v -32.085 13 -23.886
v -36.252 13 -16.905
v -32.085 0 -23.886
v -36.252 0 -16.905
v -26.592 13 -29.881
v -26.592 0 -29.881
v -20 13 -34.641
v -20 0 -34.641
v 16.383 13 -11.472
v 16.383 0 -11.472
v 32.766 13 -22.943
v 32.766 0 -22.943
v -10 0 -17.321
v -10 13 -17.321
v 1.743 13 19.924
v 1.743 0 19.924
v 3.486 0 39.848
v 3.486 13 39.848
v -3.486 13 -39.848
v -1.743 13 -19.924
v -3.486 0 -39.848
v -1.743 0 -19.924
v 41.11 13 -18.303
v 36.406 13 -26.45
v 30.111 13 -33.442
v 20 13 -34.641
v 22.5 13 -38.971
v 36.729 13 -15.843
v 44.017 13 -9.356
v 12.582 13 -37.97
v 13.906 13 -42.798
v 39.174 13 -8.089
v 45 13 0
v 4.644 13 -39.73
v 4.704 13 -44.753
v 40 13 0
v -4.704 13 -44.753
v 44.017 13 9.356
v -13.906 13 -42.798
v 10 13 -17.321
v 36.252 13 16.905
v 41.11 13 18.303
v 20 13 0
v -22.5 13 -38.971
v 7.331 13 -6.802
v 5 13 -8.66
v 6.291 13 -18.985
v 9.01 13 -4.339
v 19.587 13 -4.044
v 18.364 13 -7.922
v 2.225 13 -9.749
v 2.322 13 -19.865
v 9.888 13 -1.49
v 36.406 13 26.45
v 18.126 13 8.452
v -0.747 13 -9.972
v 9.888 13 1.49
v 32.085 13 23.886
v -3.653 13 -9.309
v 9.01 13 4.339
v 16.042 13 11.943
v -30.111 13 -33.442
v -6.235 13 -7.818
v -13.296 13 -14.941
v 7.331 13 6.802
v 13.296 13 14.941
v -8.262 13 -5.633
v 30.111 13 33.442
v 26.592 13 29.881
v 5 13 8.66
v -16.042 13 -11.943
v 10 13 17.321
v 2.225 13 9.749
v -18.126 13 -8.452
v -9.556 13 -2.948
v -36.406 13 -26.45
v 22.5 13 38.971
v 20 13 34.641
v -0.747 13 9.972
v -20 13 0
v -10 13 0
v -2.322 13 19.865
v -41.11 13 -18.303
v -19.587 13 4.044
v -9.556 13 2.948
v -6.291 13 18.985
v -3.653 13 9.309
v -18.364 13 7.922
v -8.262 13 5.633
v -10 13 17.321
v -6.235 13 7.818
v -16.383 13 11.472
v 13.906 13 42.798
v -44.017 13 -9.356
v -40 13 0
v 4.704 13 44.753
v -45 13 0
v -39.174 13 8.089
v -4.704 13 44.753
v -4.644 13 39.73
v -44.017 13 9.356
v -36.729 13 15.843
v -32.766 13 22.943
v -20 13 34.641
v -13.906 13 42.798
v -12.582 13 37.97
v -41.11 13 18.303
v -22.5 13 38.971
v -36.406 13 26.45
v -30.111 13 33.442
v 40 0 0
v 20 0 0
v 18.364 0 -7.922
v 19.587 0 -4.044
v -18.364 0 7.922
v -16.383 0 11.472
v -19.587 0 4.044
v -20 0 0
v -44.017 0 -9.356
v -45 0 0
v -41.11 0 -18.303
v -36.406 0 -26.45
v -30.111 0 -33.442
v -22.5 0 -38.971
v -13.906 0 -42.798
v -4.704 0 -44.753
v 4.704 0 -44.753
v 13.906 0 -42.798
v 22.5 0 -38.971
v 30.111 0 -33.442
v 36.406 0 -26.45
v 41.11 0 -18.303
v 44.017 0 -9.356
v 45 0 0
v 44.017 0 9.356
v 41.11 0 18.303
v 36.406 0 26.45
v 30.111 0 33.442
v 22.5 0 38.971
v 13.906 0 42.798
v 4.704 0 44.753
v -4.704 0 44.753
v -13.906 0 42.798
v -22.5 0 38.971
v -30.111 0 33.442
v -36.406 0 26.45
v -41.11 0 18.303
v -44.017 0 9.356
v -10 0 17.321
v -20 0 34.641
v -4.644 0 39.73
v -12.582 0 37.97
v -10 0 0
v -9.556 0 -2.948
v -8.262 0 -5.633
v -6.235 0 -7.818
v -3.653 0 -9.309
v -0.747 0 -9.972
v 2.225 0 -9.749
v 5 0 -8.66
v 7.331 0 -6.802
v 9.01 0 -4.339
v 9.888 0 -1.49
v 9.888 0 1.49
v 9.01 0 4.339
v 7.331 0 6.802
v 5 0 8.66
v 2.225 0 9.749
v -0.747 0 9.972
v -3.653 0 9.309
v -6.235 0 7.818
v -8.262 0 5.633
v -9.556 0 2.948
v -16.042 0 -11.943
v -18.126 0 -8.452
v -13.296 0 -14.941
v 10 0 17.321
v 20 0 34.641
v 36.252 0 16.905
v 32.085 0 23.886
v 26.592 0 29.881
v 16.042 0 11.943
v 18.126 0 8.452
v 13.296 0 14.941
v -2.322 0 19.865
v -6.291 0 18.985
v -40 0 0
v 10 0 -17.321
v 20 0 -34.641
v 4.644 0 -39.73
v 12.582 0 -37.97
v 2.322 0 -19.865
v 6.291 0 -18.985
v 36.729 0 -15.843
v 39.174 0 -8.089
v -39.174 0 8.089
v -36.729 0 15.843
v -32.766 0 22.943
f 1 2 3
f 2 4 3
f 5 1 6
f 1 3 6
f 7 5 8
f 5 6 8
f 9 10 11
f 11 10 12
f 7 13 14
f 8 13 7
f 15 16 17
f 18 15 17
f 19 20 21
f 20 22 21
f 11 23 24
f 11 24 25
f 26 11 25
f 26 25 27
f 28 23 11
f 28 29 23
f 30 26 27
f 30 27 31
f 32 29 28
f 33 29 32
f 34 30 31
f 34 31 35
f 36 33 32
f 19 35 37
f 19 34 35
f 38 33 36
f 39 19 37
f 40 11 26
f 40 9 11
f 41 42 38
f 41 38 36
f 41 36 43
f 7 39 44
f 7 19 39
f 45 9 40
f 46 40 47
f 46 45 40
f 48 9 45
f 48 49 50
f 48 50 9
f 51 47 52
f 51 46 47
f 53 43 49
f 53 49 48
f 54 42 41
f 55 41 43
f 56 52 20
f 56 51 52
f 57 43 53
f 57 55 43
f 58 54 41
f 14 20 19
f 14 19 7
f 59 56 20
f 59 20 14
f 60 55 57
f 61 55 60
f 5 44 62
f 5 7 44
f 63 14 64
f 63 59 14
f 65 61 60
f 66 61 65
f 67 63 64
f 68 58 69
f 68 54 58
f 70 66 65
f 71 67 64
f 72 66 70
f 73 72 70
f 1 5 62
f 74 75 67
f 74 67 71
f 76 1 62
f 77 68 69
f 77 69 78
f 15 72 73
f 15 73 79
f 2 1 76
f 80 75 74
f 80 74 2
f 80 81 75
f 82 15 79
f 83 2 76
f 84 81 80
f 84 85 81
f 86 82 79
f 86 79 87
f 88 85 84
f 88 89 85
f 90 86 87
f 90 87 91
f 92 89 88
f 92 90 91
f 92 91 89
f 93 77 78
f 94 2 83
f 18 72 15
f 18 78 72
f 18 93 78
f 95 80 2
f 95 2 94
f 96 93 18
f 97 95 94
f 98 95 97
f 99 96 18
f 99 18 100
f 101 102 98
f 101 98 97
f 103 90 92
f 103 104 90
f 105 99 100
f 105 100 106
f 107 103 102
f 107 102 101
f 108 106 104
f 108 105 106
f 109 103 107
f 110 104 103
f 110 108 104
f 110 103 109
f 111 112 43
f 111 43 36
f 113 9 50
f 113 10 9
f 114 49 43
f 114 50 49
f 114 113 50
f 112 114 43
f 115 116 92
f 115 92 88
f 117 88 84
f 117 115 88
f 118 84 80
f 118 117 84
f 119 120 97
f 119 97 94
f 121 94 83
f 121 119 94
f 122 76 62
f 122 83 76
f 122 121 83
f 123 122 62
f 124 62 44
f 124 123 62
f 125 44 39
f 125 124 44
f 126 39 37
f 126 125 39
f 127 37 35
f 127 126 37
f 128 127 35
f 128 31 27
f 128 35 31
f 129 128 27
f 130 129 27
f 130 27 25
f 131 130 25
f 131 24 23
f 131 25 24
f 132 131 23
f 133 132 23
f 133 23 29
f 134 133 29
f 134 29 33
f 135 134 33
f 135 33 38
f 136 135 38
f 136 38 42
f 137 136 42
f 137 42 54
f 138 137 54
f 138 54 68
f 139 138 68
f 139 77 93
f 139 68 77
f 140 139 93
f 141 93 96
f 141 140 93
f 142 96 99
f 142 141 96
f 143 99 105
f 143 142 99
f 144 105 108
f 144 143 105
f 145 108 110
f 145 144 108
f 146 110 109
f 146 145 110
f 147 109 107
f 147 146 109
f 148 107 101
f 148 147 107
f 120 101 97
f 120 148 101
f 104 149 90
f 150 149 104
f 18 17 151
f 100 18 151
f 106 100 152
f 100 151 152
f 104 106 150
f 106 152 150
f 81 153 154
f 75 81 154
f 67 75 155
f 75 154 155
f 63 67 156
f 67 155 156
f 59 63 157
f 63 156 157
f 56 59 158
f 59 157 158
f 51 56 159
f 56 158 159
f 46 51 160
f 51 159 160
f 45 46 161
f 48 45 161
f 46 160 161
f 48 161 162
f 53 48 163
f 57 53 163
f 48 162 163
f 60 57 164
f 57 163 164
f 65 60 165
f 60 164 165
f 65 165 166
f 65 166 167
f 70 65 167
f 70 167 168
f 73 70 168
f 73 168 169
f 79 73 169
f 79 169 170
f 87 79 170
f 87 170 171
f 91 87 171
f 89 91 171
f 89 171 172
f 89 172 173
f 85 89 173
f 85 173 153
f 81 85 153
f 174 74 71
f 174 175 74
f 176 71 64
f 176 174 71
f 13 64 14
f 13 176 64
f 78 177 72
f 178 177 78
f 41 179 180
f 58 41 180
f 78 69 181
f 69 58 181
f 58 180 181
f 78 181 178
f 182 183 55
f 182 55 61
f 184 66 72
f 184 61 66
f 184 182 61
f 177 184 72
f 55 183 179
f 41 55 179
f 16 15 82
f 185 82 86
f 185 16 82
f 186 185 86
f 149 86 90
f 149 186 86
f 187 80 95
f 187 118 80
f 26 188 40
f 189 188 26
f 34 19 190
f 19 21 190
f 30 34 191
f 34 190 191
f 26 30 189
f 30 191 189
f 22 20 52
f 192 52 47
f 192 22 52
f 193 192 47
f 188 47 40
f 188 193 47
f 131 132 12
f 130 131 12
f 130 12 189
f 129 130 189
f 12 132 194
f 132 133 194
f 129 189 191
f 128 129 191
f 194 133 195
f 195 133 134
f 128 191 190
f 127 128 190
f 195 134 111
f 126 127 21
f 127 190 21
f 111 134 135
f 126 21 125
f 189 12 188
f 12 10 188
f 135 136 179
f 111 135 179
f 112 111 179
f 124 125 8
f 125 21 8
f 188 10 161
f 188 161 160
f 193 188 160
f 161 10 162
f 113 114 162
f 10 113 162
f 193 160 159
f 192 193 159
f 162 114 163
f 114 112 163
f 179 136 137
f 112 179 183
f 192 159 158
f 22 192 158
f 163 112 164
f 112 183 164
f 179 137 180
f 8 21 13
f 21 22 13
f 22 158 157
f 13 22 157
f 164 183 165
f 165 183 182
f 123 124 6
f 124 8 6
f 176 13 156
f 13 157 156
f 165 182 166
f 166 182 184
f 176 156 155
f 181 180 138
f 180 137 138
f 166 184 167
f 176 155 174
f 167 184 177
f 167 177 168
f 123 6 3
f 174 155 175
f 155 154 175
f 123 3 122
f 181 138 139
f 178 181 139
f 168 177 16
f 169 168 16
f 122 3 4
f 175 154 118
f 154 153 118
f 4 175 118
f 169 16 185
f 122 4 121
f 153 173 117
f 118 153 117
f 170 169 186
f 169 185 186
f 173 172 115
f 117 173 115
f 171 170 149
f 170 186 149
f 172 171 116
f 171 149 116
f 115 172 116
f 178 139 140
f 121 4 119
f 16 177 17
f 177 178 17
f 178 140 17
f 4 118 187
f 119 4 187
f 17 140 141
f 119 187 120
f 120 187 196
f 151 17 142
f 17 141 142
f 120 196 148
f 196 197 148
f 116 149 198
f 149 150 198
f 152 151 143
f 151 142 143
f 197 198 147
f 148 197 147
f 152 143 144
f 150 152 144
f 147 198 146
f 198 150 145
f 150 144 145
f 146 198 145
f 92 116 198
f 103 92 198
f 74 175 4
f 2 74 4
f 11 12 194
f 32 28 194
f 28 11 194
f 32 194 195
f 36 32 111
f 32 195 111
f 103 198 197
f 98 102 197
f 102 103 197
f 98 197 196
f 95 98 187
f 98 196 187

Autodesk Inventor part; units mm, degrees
ref_plane "YZ Plane" through (0, 0, 0) normal (1, 0, 0) x (0, 1, 0)
ref_plane "XZ Plane" through (0, 0, 0) normal (0, 1, 0) x (-1, 0, 0)
ref_plane "XY Plane" through (0, 0, 0) normal (0, 0, 1) x (1, 0, 0)
sketch "Sketch1" plane through (0, 0, 0) normal (0, 1, 0) x (-1, 0, 0)
  circle A0 centre (0, 0) radius 45
  dimension "d0" = 90
extrude "Extrusion1" add sketch "Sketch1" along normal blind 13
sketch "Sketch2" plane through (0, 0, 0) normal (0, 1, 0) x (-1, 0, 0)
  circle A0 centre (0, 0) radius 10
  line L0 (0, 0) -> (-40, 0)
  line L1 (0, 0) -> (-32.7661, -22.9431)
  arc A1 (-20, 0) -> (-16.383, -11.4715) centre (0, 0) ccw
  arc A2 (-40, 0) -> (-32.7661, -22.9431) centre (0, 0) ccw
  dimension "d3" = 20
  dimension "d5" = 35
  dimension "d16" = 40
extrude "Extrusion2" cut sketch "Sketch2" along normal blind 13 contours A0 L1 L0 | L0 L1 A0 | A1 L1 A2 L0
pattern_circular "Circular Pattern1" count 6 over 360 about axis through (0, 0, 0) along (0, 1, 0) of "Extrusion2"
properties part number "Brushless Motor Case"
